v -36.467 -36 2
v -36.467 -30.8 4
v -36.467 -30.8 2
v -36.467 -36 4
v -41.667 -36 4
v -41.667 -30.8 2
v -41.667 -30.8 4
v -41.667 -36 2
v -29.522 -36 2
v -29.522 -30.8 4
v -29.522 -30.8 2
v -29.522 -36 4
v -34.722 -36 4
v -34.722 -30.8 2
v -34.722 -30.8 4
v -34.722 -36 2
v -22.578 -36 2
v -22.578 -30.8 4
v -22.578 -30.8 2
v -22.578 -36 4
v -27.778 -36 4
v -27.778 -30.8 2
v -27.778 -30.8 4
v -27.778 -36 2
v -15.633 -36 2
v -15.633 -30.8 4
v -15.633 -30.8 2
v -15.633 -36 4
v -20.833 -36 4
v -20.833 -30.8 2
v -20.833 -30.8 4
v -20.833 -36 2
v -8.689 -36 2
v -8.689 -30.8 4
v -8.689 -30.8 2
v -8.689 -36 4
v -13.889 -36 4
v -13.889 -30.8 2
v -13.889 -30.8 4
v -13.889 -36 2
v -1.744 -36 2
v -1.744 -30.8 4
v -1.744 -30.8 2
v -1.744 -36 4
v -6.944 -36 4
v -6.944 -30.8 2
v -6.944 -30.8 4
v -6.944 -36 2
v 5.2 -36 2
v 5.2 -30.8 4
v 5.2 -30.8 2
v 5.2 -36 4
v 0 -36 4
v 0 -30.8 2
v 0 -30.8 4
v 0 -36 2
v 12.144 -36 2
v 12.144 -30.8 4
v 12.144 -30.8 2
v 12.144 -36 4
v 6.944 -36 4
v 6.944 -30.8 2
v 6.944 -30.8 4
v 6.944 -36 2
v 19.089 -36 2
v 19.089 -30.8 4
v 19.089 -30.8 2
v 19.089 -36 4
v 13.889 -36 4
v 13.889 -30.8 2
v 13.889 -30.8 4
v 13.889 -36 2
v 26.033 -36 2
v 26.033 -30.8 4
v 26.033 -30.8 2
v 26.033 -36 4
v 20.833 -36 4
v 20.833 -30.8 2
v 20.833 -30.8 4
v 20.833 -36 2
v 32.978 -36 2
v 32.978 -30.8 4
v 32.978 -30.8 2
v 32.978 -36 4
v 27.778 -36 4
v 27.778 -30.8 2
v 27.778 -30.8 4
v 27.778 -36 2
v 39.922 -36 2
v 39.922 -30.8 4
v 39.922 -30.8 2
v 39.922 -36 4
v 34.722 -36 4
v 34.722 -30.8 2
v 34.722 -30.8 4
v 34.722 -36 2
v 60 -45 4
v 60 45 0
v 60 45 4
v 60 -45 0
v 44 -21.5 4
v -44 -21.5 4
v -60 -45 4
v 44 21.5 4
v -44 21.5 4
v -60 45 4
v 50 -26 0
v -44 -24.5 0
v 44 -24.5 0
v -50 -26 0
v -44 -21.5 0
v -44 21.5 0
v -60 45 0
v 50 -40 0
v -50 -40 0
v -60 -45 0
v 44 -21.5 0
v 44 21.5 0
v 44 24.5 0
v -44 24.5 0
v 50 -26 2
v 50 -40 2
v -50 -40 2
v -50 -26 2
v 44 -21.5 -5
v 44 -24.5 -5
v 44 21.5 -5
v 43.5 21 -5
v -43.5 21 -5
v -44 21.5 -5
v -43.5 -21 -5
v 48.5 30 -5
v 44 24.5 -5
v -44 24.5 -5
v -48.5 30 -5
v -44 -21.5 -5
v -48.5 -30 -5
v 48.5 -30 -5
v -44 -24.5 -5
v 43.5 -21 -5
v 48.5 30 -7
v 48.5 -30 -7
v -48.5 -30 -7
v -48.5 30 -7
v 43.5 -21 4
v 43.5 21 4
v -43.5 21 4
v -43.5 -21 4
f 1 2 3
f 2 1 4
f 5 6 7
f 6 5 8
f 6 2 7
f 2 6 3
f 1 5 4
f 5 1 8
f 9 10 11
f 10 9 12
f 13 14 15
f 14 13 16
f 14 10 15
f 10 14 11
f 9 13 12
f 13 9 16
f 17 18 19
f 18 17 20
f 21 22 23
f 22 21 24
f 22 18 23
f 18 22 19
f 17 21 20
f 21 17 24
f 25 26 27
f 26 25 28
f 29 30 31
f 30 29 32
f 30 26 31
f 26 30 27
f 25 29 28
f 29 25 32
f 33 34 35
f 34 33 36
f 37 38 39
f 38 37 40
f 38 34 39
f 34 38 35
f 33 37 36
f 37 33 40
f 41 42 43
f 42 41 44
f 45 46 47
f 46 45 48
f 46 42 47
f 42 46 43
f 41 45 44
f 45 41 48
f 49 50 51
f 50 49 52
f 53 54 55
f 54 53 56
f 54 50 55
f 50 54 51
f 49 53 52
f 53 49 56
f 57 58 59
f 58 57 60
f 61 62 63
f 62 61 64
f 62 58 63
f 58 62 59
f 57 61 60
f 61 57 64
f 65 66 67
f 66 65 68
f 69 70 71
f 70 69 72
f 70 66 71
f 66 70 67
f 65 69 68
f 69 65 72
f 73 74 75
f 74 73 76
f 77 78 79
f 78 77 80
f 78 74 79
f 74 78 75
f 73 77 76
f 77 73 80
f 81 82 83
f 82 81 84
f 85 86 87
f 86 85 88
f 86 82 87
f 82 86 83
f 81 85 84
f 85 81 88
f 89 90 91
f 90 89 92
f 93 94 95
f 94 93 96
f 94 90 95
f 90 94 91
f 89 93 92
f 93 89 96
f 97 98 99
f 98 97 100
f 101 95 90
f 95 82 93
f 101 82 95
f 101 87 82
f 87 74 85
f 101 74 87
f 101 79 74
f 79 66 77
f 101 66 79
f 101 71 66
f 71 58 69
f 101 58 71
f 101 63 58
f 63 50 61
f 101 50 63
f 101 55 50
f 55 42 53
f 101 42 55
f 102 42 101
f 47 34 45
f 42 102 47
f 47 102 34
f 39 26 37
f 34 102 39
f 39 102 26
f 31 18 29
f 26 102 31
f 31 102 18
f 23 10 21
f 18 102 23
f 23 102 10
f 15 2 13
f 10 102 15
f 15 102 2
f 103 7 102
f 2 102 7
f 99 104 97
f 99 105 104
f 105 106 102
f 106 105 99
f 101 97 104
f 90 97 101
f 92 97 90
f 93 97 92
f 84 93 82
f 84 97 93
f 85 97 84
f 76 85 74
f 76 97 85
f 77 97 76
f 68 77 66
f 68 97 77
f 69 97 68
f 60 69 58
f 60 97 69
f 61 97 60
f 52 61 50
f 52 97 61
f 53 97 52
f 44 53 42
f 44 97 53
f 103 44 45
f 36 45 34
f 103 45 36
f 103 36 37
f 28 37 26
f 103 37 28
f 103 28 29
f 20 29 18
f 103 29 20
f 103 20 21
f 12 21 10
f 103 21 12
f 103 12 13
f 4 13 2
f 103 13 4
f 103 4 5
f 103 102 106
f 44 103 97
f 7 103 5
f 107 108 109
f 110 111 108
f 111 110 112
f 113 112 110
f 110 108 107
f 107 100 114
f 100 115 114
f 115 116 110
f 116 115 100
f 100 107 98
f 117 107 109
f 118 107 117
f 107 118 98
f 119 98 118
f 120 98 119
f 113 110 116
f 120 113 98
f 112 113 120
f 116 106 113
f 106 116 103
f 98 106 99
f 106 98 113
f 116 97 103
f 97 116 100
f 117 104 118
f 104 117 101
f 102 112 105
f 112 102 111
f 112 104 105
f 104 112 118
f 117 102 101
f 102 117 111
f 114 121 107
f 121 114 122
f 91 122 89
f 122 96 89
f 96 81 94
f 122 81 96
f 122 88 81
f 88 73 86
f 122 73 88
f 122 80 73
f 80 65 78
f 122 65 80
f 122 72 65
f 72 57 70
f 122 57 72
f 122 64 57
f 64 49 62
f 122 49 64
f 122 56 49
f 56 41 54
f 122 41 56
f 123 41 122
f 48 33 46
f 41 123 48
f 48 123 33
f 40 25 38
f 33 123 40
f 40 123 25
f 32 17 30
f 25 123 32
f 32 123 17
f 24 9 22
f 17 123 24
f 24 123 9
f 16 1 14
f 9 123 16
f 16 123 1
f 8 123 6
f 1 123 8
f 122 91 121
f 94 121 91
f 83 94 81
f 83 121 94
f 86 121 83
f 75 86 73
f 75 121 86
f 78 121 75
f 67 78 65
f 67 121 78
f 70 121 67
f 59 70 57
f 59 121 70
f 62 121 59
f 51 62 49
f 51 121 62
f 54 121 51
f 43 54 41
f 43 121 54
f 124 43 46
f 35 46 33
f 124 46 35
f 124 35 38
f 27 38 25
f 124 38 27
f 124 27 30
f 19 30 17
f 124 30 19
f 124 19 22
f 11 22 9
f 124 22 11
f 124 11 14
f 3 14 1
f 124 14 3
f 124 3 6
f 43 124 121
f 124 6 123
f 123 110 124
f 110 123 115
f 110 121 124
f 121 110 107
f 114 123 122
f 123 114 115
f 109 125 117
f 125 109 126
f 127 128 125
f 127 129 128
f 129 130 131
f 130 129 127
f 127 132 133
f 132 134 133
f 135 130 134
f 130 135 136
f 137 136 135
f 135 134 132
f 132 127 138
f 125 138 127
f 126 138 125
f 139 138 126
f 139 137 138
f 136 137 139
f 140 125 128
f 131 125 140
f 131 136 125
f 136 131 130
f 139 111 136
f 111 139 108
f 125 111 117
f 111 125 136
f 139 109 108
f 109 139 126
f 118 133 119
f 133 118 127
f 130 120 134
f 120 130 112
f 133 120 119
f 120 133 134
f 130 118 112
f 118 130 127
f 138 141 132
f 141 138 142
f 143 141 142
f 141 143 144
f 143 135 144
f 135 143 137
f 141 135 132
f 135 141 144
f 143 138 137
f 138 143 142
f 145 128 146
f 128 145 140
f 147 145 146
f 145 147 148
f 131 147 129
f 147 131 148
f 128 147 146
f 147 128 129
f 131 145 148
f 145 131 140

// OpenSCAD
LEDS_PER_METER = 144;
LED_WIDTH = 5.2;
LED_LENGTH = 5.2;

module draw_led(x, y, z, h)
{
   translate([x, y, z - 1])
   cube([LED_LENGTH, LED_WIDTH, h + 2]);
}

module lcd(y)
{
   color([1, 0, 0])
   translate([0, 0, y])
   cube([97, 60, 2], true); 
   
   color([.5, .5, .5])
   translate([0, 0, y + 5])
   cube([87, 42, 10], true); 
   
}

module front()
{
   difference()
   {
      color([0, 0, 1])
      {
         translate([-60, -45, 0])
         cube([120, 90, 4]);
      }
      
      // LCD cutout
      color([1, 0, 1])
      {
         translate([-44, -21.5, -1])
         cube([88, 43, 6]);
      }
      
      // LED cutouts
      color([1, 0, 1])
      {
         spacing = 1000 / LEDS_PER_METER;
         for (x = [0 : 11])
         {
            start = -12 * spacing / 2;
            draw_led(start + (x * spacing), -36, 0, 6);
         }
      }
      
      // LED relief
      color([1, 0, 1])
      {
         translate([-50, -40, -1])
         cube([100, 14, 3]);
      }
   }
   
   color([0, 0, 1])
   {
      translate([-44, -24.5, -5])
      cube([88, 3, 5]);
      
      translate([-44, 21.5, -5])
      cube([88, 3, 5]);
   }
}   

front();
lcd(-6);
